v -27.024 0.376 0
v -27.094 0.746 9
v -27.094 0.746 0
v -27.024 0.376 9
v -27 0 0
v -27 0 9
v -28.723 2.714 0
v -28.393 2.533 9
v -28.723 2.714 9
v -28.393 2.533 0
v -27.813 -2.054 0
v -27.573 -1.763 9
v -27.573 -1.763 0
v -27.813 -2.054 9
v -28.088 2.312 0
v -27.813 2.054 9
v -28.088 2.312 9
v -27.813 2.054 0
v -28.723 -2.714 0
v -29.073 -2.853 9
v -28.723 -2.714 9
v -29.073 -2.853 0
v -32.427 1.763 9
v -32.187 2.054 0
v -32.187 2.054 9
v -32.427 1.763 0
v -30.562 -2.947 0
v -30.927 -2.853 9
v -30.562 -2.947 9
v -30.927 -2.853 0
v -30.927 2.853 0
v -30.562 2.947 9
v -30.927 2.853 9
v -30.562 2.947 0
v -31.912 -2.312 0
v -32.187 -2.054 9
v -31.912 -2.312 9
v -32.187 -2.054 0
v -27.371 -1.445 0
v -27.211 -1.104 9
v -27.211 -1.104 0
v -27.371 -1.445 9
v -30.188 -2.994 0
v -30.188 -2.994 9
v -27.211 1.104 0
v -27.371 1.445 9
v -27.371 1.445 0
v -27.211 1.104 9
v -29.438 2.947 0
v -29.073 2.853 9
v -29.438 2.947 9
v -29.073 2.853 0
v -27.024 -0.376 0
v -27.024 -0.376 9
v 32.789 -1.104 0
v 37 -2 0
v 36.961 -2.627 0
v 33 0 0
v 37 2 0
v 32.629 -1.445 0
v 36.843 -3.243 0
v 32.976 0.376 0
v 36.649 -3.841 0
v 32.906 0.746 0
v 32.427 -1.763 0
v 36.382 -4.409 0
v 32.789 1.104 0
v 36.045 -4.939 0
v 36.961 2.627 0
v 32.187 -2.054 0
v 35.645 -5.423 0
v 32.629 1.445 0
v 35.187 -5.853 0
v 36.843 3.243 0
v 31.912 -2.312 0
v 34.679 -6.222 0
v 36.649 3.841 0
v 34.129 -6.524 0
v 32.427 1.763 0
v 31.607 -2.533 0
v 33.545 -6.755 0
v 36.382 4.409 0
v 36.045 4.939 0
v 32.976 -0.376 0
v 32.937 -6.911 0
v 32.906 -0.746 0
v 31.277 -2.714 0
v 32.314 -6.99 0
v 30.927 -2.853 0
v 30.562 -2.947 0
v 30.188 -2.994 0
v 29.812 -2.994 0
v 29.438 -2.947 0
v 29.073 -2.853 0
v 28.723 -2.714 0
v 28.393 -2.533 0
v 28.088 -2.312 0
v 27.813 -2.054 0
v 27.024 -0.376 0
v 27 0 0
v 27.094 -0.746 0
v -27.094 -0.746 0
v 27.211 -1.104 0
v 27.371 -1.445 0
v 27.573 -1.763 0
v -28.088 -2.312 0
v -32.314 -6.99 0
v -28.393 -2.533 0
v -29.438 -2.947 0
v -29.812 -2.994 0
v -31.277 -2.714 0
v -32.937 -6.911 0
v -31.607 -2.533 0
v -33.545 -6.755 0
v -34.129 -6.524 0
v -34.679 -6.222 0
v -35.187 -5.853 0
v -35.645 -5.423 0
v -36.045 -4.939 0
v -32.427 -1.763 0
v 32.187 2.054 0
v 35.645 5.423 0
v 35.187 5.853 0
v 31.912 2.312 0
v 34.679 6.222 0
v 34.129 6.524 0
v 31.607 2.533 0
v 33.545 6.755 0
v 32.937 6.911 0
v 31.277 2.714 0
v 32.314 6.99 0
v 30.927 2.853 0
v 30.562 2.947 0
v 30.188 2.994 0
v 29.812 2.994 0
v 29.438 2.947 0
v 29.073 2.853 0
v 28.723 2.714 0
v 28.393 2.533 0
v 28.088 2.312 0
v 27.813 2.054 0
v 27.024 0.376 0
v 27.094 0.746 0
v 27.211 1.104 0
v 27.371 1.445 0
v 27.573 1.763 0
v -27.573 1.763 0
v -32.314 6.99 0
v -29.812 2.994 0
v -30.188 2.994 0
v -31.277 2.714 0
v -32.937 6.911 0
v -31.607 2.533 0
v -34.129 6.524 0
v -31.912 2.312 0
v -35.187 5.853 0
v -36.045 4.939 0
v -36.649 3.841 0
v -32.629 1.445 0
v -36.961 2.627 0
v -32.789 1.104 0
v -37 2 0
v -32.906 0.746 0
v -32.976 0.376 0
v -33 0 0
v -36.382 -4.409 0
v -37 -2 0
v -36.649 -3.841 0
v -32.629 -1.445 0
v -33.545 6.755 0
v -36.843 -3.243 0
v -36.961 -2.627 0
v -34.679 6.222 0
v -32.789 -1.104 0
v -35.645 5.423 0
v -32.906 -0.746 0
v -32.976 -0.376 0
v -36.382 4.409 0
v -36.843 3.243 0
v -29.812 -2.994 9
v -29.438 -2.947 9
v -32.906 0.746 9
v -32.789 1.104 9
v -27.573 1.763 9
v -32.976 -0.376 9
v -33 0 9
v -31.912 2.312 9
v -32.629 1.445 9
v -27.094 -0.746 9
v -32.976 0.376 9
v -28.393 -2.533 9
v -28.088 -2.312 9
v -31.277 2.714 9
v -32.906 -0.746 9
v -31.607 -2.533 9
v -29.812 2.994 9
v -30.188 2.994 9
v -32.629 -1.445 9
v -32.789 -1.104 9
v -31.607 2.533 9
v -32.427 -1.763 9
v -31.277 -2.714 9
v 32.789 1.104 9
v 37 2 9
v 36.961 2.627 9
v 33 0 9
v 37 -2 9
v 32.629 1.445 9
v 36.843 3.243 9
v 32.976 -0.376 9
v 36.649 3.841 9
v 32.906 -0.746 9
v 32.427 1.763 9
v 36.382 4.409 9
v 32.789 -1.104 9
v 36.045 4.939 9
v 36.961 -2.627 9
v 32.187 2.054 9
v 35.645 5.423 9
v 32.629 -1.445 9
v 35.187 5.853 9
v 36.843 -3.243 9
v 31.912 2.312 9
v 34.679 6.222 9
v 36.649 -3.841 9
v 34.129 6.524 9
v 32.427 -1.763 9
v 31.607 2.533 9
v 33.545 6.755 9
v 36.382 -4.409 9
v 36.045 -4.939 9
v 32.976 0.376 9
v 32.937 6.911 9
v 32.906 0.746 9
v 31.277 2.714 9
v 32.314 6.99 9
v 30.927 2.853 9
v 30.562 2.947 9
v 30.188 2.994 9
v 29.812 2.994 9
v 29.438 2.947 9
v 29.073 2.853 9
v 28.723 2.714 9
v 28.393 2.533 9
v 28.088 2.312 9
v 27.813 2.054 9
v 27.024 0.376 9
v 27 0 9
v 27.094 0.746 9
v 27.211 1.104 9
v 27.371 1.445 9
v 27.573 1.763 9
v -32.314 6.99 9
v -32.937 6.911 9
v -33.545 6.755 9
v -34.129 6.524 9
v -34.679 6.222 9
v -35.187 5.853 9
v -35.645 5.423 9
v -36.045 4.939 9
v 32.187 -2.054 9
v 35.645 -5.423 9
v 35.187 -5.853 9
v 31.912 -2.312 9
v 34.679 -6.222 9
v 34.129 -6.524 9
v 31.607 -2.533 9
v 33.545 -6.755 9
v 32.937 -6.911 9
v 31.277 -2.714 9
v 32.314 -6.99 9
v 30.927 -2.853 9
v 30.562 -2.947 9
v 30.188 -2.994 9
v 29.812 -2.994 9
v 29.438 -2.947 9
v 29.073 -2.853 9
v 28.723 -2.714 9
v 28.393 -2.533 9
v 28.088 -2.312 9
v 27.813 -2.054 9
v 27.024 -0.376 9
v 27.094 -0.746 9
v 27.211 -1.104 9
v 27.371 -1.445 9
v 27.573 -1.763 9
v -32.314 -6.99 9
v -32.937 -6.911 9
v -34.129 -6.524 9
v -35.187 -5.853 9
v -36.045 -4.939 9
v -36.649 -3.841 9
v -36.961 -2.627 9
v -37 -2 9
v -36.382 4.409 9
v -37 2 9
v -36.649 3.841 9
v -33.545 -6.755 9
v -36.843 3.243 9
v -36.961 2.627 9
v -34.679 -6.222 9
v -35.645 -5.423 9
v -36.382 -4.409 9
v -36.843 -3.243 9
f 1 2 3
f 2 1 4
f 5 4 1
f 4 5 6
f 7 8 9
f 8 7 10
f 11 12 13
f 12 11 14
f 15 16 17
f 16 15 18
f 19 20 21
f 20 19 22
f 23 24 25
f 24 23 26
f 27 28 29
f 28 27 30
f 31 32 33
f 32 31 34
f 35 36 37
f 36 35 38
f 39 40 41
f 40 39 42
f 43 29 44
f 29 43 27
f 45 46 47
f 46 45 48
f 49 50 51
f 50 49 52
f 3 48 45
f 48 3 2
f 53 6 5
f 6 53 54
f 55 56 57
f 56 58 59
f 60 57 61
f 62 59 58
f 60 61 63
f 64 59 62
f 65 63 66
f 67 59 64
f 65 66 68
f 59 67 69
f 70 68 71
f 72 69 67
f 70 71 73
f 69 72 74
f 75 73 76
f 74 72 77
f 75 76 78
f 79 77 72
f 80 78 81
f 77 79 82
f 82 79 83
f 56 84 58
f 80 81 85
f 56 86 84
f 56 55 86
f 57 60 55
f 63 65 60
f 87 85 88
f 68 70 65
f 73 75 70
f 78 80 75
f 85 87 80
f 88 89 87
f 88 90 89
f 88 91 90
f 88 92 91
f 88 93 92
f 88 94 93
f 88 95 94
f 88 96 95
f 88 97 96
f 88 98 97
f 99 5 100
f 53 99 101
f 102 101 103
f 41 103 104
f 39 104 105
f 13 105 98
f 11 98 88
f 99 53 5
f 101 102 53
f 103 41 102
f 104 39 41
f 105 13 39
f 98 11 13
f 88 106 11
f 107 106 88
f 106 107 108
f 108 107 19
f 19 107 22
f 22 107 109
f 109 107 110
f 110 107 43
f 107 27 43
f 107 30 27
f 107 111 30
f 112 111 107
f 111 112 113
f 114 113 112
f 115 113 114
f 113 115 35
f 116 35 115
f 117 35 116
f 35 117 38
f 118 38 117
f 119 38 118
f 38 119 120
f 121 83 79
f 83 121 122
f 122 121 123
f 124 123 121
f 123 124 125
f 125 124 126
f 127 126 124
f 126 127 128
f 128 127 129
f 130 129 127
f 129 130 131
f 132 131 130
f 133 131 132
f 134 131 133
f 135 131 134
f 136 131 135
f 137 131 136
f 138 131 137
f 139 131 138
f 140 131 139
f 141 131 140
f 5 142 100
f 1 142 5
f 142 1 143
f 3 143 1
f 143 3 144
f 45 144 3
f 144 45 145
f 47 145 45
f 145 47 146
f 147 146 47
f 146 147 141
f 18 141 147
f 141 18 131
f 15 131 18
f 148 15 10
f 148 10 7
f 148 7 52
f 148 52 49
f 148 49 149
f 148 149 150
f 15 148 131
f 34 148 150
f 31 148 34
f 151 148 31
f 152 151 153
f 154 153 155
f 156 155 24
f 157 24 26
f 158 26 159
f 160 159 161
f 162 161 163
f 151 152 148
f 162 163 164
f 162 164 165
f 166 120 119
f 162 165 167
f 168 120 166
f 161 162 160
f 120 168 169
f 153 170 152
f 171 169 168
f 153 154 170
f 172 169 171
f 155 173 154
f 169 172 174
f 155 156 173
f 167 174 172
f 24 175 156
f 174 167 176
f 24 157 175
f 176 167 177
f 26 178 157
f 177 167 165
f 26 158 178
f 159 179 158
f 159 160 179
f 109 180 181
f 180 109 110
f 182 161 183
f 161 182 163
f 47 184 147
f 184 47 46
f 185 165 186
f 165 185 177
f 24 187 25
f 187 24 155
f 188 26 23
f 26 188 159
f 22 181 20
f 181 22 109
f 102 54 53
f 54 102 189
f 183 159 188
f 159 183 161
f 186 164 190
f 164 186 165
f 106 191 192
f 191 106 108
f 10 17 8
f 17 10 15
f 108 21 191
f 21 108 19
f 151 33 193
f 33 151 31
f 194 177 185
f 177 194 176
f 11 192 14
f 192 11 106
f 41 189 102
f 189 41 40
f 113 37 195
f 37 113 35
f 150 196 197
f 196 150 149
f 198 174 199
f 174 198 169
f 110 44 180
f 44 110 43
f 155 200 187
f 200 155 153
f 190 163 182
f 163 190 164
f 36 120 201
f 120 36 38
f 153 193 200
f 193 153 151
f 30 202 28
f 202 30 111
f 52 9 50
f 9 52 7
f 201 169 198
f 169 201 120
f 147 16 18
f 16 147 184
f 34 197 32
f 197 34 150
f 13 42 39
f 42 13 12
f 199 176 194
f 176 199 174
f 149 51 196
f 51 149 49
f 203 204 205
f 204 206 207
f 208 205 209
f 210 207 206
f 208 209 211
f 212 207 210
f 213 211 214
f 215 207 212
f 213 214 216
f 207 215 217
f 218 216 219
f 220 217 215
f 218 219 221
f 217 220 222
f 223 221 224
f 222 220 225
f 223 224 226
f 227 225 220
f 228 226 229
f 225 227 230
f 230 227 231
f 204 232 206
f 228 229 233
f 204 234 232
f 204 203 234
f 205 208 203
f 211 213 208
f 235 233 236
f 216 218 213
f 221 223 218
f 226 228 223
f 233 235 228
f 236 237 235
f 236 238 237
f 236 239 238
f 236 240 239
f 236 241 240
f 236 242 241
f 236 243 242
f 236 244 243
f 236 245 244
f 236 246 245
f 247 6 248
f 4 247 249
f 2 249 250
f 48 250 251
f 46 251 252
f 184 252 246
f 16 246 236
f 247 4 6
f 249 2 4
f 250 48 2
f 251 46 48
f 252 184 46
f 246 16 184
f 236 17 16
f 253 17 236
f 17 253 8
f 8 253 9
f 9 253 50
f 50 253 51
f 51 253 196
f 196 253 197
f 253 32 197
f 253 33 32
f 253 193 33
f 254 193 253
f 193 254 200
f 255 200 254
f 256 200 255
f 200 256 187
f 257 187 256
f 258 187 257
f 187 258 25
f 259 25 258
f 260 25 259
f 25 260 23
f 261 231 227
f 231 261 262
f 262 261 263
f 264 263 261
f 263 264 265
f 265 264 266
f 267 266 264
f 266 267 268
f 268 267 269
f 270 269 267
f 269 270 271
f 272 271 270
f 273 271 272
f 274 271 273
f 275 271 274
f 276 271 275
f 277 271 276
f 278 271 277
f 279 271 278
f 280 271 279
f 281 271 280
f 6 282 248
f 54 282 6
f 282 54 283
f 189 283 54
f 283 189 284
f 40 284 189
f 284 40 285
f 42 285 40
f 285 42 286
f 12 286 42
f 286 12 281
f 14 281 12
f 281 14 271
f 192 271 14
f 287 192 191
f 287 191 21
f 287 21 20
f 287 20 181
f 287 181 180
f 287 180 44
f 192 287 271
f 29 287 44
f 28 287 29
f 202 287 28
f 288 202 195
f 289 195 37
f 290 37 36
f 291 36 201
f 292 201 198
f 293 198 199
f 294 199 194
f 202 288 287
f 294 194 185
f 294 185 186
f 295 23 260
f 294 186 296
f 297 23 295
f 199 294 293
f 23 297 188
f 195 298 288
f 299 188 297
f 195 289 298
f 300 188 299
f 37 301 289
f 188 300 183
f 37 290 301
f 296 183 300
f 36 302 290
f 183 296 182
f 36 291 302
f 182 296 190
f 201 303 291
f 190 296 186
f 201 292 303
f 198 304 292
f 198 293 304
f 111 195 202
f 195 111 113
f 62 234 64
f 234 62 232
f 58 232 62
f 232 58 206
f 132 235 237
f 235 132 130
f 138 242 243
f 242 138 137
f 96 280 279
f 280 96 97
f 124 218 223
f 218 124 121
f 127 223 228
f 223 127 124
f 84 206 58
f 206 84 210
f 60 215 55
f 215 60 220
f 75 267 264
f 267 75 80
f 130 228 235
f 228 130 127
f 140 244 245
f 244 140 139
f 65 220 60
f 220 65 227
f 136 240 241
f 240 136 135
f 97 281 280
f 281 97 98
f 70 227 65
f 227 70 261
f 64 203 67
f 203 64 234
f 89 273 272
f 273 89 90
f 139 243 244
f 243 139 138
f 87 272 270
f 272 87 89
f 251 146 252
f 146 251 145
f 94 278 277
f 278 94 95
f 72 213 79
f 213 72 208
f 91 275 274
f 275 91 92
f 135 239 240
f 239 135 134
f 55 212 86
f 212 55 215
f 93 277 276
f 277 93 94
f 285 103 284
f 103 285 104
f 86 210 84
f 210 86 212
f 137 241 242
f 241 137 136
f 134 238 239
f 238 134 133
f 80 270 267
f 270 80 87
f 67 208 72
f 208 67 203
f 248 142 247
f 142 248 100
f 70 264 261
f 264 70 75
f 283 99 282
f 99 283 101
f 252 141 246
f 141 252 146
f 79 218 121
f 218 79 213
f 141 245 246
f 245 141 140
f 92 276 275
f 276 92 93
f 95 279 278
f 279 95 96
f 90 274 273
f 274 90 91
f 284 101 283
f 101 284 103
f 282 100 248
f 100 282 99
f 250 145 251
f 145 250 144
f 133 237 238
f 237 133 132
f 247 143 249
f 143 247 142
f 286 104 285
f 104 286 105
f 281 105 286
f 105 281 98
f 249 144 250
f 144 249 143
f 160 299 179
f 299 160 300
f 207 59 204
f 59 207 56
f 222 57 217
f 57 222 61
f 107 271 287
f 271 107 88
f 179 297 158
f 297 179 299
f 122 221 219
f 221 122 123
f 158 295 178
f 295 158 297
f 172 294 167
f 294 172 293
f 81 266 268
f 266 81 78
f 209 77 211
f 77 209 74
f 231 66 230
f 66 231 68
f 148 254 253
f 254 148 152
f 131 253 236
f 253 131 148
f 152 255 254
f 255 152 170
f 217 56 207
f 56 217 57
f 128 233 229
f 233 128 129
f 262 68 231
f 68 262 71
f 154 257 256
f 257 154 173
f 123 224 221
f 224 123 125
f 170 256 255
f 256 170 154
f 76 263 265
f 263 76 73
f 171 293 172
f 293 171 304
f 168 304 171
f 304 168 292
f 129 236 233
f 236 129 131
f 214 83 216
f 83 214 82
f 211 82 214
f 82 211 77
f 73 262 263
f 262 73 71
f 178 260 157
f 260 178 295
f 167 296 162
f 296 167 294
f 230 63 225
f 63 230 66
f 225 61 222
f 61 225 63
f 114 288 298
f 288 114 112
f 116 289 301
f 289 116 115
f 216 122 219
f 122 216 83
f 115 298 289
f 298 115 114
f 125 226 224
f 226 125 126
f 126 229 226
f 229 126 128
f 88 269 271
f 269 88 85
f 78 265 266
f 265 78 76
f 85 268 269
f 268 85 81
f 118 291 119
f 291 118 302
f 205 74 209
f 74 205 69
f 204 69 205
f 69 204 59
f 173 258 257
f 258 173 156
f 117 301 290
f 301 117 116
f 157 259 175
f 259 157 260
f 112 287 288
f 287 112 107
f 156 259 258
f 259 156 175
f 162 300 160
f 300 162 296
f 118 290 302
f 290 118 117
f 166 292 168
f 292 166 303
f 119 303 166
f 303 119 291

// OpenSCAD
$fn = 50;


difference() {
	union() {
		hull() {
			translate(v = [-32.0000000000, 2.0000000000, 0]) {
				cylinder(h = 9, r = 5);
			}
			translate(v = [32.0000000000, 2.0000000000, 0]) {
				cylinder(h = 9, r = 5);
			}
			translate(v = [-32.0000000000, -2.0000000000, 0]) {
				cylinder(h = 9, r = 5);
			}
			translate(v = [32.0000000000, -2.0000000000, 0]) {
				cylinder(h = 9, r = 5);
			}
		}
	}
	union() {
		translate(v = [-30.0000000000, 0.0000000000, 0]) {
			cylinder(h = 9, r = 3.0000000000);
		}
		translate(v = [30.0000000000, 0.0000000000, 0]) {
			cylinder(h = 9, r = 3.0000000000);
		}
		translate(v = [-30.0000000000, 0.0000000000, 0]) {
			cylinder(h = 9, r = 1.5000000000);
		}
		translate(v = [30.0000000000, 0.0000000000, 0]) {
			cylinder(h = 9, r = 1.5000000000);
		}
		translate(v = [-30.0000000000, 0.0000000000, 0]) {
			cylinder(h = 9, r = 1.5000000000);
		}
		translate(v = [30.0000000000, 0.0000000000, 0]) {
			cylinder(h = 9, r = 1.5000000000);
		}
		translate(v = [-30.0000000000, 0.0000000000, 0]) {
			cylinder(h = 9, r = 1.5000000000);
		}
		translate(v = [30.0000000000, 0.0000000000, 0]) {
			cylinder(h = 9, r = 1.5000000000);
		}
	}
}
